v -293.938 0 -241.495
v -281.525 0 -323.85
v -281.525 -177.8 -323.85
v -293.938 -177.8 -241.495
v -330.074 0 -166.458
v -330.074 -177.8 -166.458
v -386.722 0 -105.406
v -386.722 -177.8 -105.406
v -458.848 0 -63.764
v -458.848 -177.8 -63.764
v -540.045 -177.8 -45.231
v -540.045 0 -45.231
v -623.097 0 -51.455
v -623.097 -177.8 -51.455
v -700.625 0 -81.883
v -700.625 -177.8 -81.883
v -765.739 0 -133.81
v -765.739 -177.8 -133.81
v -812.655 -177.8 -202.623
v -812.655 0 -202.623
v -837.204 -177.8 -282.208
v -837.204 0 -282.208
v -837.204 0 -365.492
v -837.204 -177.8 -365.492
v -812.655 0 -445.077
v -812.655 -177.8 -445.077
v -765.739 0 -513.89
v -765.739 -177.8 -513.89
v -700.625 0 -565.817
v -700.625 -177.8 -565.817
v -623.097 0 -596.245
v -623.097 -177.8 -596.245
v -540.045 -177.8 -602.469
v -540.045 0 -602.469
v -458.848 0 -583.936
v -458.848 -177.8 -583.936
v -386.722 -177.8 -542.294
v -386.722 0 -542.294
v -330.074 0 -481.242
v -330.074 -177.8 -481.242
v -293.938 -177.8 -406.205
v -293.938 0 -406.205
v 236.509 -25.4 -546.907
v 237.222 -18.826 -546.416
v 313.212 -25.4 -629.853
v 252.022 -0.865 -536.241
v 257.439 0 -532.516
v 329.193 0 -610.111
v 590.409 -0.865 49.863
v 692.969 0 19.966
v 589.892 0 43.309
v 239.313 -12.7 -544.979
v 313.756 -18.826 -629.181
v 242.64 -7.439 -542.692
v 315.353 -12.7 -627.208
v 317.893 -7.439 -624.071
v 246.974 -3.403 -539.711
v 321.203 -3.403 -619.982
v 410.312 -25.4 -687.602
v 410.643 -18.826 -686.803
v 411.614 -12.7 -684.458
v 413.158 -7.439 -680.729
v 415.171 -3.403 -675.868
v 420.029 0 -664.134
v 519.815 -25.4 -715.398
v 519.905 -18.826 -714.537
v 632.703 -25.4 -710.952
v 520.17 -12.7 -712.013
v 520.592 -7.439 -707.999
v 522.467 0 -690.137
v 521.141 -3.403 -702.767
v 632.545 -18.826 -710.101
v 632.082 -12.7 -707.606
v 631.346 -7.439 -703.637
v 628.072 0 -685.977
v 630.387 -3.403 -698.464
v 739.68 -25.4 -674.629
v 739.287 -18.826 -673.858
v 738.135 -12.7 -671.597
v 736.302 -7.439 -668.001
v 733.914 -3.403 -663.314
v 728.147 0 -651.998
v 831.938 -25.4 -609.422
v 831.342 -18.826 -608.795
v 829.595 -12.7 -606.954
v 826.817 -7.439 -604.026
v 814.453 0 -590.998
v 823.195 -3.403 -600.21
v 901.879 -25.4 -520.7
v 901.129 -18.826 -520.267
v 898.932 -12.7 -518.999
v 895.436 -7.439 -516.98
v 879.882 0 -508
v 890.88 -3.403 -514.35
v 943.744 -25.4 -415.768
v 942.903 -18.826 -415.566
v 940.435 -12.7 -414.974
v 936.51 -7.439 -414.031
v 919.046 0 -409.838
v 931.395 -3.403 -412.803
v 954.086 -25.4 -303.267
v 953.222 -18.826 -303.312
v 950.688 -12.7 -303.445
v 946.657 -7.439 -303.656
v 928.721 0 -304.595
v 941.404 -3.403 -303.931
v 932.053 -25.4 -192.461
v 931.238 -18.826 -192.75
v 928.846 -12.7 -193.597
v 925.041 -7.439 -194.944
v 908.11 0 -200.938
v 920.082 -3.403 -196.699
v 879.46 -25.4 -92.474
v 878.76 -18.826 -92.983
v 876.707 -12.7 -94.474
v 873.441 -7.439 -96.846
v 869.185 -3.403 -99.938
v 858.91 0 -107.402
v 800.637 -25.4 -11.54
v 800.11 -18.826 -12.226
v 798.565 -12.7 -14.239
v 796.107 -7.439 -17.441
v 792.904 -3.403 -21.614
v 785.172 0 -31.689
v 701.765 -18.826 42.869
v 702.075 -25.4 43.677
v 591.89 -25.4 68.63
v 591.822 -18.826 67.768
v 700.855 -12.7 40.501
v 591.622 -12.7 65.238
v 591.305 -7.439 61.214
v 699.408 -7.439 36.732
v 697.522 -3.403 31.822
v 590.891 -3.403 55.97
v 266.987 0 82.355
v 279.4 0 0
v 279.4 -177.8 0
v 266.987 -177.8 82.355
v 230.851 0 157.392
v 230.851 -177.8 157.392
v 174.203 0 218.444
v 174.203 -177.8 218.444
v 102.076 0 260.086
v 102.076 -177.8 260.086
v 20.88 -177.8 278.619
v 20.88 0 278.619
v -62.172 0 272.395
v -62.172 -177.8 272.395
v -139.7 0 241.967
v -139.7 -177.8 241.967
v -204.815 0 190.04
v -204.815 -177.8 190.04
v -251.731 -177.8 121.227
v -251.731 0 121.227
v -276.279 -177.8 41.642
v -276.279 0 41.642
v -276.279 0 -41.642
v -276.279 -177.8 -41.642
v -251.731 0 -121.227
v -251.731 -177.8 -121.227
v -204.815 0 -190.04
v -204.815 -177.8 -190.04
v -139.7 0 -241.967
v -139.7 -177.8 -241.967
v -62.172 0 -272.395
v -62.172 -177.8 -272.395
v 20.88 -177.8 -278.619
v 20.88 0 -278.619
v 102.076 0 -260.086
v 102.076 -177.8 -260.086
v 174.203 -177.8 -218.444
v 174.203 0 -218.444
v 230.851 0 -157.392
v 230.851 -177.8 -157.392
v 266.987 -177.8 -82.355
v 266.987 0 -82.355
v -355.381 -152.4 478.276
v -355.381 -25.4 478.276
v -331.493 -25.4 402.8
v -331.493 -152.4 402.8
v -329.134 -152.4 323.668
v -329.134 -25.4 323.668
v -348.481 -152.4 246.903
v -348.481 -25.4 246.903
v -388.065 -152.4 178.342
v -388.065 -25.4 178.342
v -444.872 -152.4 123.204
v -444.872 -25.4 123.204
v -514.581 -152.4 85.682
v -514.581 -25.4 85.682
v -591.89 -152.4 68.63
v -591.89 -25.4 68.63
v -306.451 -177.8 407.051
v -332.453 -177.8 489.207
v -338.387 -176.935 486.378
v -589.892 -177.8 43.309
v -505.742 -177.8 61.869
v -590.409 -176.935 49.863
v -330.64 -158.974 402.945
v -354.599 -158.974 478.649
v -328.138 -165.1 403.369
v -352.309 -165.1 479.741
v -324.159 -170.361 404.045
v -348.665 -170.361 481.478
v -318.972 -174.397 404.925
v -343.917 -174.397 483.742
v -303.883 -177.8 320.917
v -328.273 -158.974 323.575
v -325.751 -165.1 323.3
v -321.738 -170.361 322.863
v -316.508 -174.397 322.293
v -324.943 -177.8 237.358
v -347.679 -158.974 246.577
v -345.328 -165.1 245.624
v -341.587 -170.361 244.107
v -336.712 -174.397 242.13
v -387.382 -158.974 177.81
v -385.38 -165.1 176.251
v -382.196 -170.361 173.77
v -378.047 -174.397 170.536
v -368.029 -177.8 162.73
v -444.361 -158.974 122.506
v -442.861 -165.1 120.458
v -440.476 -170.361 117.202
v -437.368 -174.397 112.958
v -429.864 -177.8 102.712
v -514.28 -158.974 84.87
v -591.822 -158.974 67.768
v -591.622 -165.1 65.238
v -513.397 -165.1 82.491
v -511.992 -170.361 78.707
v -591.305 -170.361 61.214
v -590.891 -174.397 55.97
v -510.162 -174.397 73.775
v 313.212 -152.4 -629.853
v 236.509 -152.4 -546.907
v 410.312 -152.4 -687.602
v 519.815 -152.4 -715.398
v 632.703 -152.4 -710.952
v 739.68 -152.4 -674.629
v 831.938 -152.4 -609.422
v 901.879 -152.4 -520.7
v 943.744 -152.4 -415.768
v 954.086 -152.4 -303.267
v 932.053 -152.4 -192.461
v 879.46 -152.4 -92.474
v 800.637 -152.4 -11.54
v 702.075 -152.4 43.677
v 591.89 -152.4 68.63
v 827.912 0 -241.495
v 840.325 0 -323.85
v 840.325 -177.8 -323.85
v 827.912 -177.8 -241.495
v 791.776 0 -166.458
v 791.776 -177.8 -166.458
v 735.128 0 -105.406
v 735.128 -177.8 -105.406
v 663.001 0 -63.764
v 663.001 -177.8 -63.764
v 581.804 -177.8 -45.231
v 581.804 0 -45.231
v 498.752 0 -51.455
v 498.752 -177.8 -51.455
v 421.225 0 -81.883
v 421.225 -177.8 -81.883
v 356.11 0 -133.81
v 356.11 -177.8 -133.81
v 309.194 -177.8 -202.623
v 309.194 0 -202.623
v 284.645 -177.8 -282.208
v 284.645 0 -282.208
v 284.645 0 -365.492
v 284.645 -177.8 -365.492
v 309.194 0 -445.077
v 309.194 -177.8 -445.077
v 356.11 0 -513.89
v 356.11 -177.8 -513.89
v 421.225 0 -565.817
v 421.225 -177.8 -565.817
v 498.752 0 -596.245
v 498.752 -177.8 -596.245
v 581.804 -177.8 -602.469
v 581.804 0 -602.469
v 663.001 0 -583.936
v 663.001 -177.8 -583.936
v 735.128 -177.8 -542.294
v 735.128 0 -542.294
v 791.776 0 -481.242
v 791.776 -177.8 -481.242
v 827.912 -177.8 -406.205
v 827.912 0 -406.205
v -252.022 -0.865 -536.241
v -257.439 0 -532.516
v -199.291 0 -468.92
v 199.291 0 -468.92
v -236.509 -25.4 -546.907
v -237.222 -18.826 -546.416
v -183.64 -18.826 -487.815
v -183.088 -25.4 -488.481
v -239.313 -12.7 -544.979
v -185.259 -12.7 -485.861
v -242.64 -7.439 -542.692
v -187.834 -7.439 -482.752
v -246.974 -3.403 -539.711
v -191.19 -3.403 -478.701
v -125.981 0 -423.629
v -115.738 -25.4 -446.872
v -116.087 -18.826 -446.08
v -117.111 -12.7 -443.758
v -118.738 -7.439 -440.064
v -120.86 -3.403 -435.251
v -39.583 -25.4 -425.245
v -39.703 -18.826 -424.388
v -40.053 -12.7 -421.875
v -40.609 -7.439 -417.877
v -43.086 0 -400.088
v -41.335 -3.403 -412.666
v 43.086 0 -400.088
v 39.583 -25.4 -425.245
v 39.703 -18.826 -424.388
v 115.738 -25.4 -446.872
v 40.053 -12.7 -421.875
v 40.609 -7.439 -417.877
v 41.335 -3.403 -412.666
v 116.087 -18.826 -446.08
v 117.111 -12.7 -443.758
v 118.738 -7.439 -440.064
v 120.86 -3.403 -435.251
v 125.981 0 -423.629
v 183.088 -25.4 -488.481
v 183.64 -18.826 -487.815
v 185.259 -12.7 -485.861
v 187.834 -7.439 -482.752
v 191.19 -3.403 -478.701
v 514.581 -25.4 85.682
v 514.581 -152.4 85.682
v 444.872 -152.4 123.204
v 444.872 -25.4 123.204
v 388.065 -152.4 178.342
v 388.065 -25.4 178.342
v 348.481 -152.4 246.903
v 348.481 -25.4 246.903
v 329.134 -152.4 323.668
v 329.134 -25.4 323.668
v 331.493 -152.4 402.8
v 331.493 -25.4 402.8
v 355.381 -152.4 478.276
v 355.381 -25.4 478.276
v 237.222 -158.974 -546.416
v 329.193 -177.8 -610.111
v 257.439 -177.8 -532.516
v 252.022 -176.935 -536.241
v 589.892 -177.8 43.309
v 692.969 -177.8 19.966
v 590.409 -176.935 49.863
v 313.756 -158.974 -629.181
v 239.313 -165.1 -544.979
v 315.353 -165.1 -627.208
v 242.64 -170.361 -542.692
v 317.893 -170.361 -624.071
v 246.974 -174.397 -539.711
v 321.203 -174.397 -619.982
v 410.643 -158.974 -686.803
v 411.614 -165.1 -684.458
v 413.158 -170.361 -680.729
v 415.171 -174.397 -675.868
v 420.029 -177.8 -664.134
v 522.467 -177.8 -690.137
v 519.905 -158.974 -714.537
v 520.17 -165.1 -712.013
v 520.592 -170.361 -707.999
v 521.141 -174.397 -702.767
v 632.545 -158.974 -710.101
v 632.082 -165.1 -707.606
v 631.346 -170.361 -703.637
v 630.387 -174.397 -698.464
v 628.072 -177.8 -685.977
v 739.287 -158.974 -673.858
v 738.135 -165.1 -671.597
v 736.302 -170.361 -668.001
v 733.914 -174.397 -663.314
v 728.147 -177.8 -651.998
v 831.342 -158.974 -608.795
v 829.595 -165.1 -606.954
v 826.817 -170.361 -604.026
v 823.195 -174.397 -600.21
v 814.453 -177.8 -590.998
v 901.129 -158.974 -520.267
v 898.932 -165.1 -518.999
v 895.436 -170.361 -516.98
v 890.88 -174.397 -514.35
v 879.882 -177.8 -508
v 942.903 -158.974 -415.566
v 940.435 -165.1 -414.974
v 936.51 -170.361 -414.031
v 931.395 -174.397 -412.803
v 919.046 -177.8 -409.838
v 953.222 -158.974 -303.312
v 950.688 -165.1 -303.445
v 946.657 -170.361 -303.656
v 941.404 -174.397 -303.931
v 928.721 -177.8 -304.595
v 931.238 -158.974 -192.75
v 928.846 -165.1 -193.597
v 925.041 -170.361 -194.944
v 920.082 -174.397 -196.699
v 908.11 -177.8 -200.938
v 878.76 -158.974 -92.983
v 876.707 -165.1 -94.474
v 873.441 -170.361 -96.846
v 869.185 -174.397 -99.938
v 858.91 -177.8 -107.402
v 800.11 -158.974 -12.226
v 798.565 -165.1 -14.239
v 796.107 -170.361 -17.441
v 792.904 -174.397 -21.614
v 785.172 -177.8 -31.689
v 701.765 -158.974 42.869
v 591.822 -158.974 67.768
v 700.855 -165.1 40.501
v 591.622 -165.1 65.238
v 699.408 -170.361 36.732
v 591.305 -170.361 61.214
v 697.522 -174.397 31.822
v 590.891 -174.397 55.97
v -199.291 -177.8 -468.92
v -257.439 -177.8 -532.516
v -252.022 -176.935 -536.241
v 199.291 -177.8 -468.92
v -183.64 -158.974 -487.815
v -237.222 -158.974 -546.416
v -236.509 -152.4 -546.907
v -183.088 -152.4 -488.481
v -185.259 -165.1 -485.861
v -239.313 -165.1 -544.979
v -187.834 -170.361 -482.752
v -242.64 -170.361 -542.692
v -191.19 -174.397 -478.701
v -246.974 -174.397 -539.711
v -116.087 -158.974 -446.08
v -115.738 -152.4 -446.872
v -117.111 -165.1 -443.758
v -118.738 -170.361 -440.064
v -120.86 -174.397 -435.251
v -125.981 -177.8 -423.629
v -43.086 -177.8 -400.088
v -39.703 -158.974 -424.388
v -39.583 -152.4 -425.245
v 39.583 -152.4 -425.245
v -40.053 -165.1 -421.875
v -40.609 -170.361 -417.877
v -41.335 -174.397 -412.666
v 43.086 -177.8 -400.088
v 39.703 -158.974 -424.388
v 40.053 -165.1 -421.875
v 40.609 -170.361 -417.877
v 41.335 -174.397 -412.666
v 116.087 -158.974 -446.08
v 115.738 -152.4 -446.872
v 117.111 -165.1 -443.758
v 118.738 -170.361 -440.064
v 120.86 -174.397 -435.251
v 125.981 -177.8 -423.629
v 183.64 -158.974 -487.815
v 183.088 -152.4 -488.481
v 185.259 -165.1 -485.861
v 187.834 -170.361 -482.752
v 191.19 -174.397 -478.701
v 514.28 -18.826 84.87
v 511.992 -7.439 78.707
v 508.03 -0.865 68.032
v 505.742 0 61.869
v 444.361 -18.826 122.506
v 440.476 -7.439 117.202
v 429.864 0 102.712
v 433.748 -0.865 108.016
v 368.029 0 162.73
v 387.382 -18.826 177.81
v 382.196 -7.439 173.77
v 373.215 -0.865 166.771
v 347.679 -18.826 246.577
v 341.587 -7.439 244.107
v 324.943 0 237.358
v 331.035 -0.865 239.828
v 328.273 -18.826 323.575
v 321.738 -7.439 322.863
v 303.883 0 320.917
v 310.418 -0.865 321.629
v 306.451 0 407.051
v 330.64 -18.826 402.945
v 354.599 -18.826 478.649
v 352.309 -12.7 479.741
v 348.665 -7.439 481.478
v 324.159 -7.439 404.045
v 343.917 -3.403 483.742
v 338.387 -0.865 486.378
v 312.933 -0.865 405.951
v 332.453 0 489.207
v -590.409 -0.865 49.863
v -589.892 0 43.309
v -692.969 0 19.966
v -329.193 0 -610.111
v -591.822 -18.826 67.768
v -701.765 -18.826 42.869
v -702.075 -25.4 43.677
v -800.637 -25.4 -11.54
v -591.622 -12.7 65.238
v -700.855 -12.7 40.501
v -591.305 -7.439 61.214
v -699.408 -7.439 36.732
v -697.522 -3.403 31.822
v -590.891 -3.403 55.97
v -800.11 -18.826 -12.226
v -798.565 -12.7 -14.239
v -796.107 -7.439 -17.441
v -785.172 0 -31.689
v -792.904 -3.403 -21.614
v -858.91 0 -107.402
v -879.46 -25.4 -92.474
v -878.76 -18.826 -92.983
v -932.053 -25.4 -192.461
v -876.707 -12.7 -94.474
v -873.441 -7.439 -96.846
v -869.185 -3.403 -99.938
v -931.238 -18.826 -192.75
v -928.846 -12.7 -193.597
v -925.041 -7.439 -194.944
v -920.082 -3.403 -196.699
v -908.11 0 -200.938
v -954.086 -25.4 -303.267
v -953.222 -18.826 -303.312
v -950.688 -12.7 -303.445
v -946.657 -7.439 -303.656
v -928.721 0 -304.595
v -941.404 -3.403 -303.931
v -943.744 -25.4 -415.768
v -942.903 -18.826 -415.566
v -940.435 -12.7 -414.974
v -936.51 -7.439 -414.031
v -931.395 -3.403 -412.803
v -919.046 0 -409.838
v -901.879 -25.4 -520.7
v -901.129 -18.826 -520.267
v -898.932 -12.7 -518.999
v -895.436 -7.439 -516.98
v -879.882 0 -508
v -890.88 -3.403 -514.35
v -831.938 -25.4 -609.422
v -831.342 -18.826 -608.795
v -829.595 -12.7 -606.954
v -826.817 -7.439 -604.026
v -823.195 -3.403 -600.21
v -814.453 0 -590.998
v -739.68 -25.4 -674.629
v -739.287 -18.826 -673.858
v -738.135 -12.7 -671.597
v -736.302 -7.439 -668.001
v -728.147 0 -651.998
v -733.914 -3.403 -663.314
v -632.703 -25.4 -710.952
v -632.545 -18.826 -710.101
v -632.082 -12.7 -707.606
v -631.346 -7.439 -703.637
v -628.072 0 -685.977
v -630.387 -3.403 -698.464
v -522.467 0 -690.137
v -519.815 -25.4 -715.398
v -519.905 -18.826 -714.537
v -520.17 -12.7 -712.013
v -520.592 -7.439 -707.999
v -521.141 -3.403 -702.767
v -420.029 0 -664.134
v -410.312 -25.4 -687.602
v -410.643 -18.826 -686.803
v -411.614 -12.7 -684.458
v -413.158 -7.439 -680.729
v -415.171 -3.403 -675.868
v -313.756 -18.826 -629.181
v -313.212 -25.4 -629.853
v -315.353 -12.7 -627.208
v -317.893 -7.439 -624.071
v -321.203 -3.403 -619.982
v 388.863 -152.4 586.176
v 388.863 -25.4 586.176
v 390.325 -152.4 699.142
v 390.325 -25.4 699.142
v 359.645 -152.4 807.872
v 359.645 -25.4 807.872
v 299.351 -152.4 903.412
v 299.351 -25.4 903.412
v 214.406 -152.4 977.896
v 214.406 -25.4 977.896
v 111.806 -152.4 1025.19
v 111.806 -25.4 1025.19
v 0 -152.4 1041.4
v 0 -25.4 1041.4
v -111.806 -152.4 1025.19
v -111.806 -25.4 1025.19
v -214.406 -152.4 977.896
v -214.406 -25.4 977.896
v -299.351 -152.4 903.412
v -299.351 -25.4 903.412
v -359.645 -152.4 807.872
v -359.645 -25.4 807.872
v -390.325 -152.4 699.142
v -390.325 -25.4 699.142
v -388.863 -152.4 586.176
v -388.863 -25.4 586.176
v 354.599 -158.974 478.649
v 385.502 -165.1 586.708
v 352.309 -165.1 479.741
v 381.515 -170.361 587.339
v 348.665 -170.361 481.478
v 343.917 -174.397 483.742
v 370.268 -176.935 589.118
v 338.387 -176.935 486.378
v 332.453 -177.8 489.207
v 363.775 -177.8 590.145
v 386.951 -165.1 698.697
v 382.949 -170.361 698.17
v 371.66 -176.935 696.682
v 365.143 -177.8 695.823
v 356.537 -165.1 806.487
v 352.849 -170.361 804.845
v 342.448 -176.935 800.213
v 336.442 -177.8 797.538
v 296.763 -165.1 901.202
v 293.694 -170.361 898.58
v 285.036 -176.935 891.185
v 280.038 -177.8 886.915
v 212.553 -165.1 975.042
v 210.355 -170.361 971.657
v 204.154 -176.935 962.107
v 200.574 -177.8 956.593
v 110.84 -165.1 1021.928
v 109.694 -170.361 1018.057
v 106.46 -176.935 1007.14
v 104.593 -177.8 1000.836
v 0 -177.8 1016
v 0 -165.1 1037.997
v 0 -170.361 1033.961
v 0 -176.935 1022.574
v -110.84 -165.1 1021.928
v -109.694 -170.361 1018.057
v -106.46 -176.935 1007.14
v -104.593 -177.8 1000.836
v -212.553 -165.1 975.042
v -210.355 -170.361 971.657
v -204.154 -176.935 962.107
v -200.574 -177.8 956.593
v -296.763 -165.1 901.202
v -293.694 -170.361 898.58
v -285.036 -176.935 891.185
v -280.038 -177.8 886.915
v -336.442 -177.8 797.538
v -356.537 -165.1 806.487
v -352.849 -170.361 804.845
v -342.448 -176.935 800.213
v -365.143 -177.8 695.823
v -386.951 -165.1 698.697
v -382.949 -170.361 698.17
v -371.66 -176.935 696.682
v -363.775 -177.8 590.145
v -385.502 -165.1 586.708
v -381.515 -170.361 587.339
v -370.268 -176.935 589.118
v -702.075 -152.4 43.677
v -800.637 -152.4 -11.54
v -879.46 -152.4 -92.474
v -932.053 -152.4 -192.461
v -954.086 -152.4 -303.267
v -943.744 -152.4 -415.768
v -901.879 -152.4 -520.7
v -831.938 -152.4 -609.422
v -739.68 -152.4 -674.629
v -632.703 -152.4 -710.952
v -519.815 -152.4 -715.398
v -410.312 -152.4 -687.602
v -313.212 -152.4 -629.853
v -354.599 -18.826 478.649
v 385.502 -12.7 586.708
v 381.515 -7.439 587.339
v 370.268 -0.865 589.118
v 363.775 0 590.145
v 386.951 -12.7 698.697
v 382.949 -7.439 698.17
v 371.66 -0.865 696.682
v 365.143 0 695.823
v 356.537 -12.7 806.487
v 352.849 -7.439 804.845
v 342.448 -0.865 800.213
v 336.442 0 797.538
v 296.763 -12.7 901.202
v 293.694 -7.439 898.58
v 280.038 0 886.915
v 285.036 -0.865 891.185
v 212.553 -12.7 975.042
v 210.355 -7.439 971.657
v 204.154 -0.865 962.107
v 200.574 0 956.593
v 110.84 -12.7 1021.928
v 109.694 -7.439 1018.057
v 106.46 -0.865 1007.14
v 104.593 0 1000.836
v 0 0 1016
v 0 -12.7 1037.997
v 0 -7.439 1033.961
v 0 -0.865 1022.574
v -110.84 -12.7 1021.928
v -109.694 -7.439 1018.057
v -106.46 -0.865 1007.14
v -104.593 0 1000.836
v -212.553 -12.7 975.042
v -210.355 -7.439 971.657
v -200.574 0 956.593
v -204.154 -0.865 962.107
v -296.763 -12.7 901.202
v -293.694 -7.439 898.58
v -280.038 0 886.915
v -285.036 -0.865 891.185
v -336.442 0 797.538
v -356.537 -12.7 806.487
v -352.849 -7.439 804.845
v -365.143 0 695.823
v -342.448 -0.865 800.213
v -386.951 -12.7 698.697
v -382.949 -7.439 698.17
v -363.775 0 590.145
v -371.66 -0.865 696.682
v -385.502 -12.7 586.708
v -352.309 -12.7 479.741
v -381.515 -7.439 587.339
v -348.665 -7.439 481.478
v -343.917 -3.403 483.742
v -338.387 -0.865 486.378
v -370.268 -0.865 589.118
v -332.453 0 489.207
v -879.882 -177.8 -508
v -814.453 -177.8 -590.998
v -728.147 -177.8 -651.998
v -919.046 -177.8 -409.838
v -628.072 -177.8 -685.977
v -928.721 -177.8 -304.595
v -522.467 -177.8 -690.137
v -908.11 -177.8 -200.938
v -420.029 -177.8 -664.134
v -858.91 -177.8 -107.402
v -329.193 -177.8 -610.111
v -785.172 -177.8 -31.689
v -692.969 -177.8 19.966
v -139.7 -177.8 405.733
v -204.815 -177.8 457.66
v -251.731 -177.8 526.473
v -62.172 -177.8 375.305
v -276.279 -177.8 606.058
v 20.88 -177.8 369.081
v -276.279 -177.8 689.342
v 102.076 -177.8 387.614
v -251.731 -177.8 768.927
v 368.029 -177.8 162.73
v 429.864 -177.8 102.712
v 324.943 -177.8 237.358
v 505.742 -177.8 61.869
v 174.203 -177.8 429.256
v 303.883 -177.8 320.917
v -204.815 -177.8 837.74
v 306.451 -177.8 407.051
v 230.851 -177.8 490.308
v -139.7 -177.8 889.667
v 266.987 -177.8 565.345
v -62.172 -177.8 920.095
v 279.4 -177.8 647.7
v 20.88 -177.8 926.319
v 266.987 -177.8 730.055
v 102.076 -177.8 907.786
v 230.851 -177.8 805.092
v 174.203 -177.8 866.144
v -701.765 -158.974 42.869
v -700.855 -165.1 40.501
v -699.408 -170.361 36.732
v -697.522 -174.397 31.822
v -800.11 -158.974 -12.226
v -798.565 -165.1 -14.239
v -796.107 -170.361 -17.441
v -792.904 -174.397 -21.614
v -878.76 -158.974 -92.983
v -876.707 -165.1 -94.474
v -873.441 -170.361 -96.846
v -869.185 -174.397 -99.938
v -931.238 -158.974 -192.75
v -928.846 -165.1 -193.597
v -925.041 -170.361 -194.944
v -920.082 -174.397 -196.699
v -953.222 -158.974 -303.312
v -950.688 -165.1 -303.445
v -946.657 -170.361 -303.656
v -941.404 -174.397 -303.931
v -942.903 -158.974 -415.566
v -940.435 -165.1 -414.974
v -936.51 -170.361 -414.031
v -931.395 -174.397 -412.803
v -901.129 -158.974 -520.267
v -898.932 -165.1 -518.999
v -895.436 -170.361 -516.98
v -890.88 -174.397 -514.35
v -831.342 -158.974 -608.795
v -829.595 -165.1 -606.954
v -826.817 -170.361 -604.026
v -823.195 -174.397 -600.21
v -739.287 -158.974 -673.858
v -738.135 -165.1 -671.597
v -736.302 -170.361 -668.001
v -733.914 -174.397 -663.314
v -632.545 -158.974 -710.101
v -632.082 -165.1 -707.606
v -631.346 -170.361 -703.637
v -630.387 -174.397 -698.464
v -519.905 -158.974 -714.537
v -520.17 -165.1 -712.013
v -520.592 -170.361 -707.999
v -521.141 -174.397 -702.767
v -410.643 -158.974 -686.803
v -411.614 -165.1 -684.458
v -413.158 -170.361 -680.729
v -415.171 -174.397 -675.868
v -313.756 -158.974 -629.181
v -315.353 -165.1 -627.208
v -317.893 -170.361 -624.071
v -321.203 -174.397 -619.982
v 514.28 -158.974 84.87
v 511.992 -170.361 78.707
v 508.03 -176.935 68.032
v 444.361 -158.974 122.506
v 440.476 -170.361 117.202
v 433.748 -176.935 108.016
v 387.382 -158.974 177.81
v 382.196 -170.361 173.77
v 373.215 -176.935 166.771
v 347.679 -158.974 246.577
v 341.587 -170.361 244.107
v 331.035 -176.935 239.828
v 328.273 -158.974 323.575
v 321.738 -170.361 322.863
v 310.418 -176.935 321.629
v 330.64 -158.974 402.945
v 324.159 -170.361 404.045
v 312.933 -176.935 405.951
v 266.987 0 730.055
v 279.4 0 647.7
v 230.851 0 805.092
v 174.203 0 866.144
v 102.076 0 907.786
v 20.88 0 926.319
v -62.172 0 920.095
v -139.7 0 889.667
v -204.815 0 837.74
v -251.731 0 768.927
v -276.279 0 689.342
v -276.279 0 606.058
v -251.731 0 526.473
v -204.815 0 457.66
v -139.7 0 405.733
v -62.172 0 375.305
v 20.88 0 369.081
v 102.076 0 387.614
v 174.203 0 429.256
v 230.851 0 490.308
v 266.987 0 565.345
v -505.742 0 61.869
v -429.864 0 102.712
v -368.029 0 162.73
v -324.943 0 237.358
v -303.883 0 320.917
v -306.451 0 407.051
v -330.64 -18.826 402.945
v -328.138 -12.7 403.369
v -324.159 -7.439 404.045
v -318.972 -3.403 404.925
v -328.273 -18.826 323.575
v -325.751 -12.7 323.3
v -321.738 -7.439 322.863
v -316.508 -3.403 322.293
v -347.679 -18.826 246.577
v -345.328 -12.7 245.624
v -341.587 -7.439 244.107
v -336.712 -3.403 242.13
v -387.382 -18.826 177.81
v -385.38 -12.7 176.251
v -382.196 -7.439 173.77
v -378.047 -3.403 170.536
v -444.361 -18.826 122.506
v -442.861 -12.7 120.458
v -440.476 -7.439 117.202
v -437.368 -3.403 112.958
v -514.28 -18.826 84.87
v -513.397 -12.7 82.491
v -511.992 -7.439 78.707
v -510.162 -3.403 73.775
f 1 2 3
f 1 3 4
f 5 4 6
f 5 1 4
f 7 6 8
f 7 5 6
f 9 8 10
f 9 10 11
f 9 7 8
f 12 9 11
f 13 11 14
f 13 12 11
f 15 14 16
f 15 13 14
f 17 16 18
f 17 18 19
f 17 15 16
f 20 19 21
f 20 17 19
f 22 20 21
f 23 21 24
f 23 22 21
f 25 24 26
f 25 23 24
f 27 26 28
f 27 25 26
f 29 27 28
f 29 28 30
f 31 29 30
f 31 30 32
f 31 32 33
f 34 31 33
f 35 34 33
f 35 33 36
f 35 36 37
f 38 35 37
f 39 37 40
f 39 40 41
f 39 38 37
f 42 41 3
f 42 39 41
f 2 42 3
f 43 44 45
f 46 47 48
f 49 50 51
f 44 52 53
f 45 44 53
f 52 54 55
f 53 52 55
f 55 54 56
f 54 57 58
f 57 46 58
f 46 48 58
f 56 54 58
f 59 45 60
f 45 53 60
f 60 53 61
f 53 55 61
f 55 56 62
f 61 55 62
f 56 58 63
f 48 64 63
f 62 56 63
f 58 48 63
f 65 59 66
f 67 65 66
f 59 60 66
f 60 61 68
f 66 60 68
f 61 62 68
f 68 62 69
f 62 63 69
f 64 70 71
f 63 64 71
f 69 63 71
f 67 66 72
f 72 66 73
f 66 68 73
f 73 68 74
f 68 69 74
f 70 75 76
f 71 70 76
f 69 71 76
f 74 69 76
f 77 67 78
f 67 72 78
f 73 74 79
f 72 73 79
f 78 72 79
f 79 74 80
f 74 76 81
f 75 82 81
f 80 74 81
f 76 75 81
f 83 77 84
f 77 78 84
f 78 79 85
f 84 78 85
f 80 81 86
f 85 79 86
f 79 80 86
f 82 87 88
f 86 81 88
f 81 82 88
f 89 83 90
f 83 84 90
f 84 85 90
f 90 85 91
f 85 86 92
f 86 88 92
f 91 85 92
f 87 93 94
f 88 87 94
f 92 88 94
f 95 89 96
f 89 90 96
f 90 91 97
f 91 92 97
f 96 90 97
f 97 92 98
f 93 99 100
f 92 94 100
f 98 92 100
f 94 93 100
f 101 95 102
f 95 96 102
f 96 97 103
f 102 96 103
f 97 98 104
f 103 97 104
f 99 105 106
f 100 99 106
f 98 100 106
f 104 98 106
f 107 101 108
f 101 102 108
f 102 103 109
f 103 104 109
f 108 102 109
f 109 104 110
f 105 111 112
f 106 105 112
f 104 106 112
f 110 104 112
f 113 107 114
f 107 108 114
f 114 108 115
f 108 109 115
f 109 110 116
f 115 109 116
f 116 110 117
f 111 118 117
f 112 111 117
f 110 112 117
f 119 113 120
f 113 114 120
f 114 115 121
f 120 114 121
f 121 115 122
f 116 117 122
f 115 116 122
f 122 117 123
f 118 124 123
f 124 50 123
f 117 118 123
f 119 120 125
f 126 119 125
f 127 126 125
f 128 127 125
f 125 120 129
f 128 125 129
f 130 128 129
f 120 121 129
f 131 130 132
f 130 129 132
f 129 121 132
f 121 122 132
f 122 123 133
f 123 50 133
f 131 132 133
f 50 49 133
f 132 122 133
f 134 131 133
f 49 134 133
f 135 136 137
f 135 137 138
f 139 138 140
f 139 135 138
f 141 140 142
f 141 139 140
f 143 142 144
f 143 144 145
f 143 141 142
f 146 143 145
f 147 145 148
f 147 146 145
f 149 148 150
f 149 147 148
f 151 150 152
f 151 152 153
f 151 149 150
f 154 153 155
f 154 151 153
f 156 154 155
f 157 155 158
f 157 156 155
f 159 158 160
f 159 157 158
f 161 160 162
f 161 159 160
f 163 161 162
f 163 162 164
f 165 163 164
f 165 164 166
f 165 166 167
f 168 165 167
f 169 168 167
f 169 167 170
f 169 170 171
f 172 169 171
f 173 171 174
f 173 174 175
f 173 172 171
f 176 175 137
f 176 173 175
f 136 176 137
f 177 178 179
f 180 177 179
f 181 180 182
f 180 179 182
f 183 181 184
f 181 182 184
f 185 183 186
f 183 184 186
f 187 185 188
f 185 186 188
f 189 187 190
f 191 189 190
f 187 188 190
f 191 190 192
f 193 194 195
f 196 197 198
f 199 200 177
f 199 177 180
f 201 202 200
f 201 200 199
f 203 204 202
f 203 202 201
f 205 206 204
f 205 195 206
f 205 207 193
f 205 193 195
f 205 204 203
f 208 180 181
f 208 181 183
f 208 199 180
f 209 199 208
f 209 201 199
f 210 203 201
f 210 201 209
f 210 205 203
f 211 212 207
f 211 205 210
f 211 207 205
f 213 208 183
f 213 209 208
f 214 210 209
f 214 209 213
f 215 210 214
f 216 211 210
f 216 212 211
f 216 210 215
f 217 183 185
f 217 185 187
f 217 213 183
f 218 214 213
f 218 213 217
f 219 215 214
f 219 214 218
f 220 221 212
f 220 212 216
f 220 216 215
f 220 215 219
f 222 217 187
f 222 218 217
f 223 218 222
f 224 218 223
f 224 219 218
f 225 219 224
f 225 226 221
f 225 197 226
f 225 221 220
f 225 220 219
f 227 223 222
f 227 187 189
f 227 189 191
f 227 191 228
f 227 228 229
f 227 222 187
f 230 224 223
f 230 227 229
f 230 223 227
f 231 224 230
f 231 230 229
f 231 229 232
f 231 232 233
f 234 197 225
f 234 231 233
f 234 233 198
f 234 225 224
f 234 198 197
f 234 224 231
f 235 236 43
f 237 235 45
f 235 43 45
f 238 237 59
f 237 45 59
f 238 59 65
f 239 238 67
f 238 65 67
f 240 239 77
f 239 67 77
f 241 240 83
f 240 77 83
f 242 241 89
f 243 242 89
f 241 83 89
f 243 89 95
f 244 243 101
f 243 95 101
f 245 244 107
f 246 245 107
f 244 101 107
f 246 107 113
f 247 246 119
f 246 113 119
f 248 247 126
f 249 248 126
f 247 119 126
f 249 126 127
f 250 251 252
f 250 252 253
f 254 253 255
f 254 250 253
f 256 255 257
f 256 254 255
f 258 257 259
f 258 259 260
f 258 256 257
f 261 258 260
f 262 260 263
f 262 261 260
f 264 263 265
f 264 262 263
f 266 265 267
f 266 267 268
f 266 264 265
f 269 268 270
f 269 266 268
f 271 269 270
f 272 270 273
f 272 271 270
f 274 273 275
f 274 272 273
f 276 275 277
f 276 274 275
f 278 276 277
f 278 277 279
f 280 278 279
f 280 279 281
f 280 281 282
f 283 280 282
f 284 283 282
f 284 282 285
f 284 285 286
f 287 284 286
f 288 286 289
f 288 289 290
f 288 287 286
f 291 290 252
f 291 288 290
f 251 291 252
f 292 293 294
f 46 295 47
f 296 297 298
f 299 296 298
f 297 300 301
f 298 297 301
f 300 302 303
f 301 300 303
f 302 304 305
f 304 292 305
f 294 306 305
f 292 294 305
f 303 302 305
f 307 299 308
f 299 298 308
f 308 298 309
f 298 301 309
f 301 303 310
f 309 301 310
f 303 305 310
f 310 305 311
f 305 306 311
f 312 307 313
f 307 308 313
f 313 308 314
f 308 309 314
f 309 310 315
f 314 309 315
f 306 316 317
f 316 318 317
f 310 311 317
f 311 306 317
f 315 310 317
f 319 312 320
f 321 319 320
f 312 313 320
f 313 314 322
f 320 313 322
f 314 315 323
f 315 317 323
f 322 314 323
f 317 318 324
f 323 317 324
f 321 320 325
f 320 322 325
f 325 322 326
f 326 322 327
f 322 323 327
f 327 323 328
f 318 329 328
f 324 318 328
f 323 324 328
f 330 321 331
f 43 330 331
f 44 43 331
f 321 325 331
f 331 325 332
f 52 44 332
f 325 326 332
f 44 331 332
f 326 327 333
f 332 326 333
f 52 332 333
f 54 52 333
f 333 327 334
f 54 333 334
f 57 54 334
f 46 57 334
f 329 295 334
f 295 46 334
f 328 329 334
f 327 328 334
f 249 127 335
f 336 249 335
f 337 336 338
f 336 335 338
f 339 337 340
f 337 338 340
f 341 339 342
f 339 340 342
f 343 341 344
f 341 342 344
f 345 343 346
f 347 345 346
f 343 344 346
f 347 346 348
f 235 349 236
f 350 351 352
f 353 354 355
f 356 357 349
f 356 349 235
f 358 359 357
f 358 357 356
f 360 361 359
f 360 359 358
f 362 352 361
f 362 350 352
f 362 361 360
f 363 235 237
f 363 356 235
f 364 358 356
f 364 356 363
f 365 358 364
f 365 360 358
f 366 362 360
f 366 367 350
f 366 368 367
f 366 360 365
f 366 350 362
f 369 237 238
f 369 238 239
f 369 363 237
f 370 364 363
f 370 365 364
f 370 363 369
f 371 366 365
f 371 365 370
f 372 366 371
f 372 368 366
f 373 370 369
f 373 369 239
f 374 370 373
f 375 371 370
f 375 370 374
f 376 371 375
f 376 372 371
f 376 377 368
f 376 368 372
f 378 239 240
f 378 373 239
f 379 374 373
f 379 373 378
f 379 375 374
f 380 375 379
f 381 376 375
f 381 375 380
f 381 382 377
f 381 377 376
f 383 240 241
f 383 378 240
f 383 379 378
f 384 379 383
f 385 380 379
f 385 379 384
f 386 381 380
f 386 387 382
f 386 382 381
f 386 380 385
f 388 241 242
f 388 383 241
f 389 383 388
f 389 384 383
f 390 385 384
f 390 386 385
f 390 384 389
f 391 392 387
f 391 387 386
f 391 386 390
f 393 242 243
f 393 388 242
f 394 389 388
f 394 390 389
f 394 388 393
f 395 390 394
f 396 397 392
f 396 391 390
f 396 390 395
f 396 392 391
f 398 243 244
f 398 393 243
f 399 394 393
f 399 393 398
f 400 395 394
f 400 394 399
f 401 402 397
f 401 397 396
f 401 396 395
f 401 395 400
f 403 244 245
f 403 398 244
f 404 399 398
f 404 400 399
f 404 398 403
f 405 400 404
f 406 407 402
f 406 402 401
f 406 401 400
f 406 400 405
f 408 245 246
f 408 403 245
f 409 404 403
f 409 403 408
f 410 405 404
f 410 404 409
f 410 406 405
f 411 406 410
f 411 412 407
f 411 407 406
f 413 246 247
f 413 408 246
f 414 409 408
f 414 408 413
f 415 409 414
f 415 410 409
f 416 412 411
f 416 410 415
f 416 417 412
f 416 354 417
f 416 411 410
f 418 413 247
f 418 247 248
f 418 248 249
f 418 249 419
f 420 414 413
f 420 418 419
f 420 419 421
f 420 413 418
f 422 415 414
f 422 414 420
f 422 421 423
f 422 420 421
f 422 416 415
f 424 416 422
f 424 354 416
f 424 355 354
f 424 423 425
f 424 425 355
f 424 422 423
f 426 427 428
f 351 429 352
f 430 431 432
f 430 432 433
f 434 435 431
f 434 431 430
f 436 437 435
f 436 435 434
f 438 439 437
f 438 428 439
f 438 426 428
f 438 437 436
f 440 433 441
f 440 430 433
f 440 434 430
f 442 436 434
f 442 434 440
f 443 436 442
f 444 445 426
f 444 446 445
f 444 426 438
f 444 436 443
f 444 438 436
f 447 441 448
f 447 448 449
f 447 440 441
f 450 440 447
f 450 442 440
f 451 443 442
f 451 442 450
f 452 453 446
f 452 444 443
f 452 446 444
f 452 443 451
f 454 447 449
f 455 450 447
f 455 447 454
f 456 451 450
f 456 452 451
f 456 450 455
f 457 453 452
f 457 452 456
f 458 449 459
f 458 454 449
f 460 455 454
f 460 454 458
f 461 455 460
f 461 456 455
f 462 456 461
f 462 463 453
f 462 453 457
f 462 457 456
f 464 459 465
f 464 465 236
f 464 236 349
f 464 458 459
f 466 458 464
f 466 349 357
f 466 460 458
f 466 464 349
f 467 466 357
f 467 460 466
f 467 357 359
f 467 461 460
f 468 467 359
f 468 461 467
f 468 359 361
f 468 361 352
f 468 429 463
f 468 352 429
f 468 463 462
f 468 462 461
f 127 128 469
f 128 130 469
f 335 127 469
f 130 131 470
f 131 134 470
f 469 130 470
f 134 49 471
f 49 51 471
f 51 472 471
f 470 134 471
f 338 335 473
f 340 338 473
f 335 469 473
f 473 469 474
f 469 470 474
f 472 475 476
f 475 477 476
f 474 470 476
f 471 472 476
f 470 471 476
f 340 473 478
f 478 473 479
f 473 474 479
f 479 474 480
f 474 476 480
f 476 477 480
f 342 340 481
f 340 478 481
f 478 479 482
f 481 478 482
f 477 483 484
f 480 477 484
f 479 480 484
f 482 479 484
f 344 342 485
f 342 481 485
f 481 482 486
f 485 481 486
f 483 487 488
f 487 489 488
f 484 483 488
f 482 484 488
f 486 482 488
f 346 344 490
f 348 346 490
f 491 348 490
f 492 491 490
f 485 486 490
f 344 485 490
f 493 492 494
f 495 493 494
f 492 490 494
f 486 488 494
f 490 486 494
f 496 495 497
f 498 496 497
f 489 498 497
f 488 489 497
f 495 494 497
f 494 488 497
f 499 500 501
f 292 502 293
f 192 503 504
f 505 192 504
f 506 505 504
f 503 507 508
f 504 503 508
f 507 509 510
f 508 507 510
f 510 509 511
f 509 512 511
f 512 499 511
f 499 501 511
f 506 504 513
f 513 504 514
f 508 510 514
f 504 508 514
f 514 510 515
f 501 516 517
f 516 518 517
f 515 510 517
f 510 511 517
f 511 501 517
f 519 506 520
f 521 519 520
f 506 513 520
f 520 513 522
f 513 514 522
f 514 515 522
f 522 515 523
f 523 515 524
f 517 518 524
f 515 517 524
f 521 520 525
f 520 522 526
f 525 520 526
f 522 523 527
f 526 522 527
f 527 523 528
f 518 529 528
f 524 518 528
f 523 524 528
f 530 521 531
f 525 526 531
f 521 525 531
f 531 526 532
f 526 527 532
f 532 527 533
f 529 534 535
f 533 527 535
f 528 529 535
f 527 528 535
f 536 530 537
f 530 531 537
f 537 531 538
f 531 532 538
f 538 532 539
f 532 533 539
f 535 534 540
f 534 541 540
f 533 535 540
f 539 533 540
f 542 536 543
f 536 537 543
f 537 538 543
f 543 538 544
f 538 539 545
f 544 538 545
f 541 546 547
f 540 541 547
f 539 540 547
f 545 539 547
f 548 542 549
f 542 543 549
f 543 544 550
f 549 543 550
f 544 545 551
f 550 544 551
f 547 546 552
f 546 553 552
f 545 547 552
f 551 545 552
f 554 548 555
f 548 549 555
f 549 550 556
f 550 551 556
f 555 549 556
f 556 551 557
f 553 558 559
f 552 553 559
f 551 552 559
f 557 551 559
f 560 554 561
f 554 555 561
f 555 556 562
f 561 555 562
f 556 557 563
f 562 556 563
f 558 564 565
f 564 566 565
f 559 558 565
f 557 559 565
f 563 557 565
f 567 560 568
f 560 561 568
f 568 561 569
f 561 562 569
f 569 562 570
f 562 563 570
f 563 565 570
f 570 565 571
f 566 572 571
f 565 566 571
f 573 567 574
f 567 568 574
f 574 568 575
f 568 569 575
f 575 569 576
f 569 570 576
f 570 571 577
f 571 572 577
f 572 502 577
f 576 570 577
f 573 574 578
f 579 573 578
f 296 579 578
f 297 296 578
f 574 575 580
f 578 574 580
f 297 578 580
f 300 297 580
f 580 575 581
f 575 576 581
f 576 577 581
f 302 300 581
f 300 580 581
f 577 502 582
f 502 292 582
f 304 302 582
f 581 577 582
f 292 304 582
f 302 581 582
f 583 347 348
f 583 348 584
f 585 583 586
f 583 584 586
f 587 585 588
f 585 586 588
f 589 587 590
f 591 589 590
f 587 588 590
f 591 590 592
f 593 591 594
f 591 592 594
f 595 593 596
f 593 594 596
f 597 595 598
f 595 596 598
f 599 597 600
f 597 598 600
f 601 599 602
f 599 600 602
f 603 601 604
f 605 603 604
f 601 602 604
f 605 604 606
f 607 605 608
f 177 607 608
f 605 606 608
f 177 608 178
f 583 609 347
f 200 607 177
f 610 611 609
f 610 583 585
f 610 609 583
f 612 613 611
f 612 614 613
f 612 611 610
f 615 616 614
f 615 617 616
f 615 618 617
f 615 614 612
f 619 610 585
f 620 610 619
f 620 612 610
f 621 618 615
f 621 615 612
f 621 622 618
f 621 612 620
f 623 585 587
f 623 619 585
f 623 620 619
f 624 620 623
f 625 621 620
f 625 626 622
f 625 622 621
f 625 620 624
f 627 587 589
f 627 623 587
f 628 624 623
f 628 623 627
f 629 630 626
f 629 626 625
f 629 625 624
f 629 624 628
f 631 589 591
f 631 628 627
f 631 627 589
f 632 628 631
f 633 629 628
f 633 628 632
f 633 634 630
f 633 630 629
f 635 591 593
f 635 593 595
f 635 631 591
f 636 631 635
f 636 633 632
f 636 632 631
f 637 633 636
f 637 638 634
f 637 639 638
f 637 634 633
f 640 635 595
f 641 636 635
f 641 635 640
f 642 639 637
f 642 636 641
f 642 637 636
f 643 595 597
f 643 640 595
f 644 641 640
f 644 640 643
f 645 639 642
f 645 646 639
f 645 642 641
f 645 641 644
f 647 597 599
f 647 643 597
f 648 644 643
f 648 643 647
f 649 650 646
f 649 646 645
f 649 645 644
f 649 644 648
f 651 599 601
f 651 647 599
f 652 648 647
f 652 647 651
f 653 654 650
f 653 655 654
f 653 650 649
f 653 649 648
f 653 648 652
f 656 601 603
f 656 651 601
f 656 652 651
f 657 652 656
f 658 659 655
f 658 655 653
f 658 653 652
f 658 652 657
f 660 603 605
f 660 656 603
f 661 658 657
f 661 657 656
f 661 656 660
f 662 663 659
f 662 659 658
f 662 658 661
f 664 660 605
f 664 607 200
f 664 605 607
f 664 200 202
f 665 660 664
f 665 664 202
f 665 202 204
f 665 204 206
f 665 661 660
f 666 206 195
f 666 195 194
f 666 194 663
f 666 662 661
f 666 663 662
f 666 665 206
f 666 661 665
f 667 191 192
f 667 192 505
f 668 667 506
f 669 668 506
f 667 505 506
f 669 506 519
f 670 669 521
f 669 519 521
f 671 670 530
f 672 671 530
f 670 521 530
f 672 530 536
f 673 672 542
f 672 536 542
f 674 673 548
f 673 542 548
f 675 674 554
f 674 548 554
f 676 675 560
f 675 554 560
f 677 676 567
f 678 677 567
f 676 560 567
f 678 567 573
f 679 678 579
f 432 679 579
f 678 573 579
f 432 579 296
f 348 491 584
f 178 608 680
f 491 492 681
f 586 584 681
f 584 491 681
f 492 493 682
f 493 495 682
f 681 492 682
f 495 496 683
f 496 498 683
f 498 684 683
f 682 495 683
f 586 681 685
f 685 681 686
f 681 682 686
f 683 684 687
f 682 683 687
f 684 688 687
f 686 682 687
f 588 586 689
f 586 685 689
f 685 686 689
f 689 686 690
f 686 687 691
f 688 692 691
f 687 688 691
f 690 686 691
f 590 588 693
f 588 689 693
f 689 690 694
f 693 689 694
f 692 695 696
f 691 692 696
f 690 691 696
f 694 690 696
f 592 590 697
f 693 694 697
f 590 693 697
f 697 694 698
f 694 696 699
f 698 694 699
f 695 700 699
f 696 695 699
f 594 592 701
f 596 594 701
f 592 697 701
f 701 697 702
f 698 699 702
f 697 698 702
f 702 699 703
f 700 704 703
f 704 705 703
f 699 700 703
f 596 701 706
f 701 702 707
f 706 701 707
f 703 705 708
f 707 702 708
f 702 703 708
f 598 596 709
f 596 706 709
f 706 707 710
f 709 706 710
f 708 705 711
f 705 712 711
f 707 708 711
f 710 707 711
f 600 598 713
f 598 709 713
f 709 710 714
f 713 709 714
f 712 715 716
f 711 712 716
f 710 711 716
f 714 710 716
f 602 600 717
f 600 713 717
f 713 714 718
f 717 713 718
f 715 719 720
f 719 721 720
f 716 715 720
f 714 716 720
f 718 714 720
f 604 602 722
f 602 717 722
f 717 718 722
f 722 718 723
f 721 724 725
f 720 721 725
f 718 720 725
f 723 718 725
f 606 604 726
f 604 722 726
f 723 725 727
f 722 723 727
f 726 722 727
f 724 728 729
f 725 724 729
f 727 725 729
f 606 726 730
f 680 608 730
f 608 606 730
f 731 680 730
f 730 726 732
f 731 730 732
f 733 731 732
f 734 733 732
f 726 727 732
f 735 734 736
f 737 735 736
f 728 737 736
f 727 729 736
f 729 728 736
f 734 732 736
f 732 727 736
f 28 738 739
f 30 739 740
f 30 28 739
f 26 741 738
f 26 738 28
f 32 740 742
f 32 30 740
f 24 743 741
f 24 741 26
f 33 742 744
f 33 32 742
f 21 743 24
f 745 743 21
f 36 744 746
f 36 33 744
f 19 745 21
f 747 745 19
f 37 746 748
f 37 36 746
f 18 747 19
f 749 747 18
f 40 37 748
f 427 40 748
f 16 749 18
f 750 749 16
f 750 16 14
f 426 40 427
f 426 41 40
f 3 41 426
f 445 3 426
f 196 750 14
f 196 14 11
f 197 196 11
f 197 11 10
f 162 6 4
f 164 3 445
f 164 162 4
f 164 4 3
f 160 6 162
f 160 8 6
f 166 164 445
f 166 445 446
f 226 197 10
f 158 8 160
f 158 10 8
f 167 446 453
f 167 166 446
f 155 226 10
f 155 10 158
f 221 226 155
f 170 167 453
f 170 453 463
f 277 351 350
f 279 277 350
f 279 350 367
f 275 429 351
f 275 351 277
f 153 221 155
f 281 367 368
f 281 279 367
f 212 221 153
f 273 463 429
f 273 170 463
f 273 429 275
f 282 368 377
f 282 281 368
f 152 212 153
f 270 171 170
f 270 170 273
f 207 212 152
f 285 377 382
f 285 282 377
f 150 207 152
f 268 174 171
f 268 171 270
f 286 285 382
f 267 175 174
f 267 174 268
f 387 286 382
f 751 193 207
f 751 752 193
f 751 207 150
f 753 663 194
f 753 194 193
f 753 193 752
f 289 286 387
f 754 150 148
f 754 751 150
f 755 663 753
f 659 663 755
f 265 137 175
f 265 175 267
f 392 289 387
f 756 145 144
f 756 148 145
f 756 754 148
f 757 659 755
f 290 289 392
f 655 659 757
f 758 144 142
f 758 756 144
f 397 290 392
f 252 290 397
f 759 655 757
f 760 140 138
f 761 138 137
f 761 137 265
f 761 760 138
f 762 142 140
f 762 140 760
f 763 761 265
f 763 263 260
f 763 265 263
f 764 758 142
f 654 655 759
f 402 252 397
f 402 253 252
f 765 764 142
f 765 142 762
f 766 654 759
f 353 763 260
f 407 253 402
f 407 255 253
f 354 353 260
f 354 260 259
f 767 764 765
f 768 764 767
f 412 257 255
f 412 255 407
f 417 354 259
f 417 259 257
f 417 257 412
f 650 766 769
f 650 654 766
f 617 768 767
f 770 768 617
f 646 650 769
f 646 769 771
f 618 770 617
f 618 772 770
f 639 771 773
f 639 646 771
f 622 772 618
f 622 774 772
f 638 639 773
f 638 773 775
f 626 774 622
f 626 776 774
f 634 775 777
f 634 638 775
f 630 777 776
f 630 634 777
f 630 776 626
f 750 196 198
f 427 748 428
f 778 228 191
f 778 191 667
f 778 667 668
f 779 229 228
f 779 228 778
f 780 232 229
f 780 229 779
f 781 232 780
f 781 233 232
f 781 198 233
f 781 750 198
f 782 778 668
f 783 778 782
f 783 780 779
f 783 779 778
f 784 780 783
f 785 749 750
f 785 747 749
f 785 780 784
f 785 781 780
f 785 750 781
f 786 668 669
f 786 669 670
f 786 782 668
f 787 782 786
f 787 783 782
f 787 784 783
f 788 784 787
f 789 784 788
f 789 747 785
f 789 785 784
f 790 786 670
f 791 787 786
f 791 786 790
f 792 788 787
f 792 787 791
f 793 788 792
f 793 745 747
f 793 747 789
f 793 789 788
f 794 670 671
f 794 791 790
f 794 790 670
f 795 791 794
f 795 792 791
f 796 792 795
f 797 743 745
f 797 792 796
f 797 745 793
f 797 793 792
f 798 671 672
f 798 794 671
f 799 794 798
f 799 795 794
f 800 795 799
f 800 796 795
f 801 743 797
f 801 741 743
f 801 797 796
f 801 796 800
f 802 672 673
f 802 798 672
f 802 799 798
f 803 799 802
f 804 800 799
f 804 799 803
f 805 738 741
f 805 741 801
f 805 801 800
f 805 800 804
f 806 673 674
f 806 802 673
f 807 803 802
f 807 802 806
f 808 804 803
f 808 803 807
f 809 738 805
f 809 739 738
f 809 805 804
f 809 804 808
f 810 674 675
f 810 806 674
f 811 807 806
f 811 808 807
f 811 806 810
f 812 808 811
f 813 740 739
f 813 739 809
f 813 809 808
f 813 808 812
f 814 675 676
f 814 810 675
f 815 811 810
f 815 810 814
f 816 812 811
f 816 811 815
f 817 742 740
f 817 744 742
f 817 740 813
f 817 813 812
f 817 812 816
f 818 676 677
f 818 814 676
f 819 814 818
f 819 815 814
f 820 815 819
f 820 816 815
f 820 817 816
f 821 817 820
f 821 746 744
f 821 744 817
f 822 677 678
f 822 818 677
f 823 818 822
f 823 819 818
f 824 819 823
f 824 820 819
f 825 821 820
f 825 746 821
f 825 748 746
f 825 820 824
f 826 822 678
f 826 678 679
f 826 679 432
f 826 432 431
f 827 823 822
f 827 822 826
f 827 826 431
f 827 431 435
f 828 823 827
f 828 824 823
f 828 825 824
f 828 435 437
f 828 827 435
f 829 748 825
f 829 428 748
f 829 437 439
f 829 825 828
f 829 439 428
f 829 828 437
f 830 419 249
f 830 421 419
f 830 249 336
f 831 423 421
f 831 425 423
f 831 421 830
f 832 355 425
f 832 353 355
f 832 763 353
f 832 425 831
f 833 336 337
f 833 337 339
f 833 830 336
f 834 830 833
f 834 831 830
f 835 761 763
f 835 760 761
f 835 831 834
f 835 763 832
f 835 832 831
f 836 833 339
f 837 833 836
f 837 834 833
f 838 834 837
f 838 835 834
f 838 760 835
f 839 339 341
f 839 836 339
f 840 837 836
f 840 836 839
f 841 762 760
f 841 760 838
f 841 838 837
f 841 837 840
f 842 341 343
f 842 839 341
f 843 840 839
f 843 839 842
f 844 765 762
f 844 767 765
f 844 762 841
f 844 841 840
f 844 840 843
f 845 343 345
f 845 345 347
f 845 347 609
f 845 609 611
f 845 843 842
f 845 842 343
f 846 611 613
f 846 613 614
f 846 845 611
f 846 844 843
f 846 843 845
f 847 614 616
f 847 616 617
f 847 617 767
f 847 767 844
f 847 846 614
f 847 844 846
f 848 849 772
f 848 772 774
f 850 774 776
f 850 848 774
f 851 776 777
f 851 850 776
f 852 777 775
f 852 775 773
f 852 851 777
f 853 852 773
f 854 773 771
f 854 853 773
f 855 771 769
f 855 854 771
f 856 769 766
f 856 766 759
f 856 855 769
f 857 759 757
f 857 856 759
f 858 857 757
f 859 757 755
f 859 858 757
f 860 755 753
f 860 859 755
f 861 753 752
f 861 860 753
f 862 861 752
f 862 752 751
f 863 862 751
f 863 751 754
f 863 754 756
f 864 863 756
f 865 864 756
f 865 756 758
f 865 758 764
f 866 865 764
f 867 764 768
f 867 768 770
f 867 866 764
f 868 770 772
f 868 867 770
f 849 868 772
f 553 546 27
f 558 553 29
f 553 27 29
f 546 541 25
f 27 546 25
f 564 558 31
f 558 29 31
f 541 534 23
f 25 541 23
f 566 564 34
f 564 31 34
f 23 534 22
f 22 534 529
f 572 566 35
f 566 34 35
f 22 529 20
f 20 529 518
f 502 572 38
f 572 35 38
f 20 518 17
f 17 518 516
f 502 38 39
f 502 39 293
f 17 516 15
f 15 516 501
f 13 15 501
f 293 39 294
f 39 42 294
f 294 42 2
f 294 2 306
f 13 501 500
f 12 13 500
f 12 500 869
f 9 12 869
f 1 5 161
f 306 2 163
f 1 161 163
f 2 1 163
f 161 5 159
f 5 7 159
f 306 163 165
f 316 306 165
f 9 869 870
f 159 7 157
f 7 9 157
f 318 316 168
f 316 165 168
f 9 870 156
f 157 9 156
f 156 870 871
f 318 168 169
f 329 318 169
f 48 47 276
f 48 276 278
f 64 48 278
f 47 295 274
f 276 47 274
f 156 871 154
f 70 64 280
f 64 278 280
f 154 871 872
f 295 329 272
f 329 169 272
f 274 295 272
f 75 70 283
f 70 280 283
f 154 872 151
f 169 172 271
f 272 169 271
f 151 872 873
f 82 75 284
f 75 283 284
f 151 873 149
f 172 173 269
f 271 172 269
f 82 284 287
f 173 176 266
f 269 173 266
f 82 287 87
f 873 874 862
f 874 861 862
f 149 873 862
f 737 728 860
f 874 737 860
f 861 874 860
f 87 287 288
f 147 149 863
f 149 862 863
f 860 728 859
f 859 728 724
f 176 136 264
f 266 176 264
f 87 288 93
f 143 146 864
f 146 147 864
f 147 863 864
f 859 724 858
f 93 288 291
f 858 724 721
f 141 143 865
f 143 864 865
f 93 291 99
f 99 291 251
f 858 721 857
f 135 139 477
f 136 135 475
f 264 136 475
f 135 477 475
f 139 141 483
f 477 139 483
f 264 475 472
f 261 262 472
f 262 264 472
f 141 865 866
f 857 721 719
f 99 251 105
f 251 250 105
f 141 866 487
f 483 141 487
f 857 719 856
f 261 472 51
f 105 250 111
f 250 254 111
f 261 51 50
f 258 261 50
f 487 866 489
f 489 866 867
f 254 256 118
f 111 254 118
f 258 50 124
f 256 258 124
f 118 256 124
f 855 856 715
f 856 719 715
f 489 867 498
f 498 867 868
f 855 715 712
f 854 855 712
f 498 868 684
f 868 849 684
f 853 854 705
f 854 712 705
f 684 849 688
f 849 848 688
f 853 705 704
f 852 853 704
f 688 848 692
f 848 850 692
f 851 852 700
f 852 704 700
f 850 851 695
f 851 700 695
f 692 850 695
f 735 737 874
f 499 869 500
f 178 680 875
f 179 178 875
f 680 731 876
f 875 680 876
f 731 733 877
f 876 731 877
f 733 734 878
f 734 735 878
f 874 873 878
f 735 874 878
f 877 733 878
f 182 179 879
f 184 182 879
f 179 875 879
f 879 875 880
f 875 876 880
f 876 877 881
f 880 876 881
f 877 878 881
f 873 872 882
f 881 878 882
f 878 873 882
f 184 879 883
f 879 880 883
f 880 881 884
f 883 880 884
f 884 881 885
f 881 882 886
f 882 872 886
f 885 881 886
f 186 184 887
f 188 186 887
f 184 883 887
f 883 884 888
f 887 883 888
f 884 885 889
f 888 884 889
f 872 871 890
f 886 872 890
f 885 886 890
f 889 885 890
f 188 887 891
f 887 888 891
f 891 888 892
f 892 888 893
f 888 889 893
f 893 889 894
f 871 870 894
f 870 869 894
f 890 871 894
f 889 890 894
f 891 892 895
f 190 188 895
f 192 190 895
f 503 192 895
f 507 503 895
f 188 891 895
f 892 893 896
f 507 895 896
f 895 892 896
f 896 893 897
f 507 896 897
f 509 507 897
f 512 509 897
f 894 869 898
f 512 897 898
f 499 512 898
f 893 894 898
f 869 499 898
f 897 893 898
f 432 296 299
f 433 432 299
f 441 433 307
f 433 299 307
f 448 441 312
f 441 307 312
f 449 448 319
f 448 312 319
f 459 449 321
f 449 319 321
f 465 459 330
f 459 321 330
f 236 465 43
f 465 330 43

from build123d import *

# Parameters (mm, degrees)
F0_R     = 279.4
F1_DEPTH = 177.8
F2_R     = 25.4


with BuildPart() as f1:
    # F0 (on Front) → F1 (new body)
    with BuildSketch(Plane.XZ):
        with BuildLine():
            ThreePointArc((591.889852, 68.630377), (365.897869, 211.251233), (355.380576, 478.276459))
            ThreePointArc((355.380576, 478.276459), (0, 1041.4), (-355.380576, 478.276459))
            ThreePointArc((-355.380576, 478.276459), (-365.897869, 211.251233), (-591.889852, 68.630377))
            ThreePointArc((-591.889852, 68.630377), (-901.878856, -520.7), (-236.509276, -546.906837))
            ThreePointArc((-236.509276, -546.906837), (0, -422.502466), (236.509276, -546.906837))
            ThreePointArc((236.509276, -546.906837), (901.878856, -520.7), (591.889852, 68.630377))
        make_face()
        with Locations((-560.924654, -323.85)):
            Circle(F0_R, mode=Mode.SUBTRACT)
        Circle(F0_R, mode=Mode.SUBTRACT)
        with Locations((560.924654, -323.85)):
            Circle(F0_R, mode=Mode.SUBTRACT)
        with Locations((0, 647.7)):
            Circle(F0_R, mode=Mode.SUBTRACT)
    extrude(amount=F1_DEPTH)

    # F2
    f2_edges = [f1.edges().sort_by_distance(p)[0] for p in [
        (0, -177.8, 1041.4),
        (0, 0, 1041.4),
    ]]
    fillet(f2_edges, radius=F2_R)


solid = f1.part
